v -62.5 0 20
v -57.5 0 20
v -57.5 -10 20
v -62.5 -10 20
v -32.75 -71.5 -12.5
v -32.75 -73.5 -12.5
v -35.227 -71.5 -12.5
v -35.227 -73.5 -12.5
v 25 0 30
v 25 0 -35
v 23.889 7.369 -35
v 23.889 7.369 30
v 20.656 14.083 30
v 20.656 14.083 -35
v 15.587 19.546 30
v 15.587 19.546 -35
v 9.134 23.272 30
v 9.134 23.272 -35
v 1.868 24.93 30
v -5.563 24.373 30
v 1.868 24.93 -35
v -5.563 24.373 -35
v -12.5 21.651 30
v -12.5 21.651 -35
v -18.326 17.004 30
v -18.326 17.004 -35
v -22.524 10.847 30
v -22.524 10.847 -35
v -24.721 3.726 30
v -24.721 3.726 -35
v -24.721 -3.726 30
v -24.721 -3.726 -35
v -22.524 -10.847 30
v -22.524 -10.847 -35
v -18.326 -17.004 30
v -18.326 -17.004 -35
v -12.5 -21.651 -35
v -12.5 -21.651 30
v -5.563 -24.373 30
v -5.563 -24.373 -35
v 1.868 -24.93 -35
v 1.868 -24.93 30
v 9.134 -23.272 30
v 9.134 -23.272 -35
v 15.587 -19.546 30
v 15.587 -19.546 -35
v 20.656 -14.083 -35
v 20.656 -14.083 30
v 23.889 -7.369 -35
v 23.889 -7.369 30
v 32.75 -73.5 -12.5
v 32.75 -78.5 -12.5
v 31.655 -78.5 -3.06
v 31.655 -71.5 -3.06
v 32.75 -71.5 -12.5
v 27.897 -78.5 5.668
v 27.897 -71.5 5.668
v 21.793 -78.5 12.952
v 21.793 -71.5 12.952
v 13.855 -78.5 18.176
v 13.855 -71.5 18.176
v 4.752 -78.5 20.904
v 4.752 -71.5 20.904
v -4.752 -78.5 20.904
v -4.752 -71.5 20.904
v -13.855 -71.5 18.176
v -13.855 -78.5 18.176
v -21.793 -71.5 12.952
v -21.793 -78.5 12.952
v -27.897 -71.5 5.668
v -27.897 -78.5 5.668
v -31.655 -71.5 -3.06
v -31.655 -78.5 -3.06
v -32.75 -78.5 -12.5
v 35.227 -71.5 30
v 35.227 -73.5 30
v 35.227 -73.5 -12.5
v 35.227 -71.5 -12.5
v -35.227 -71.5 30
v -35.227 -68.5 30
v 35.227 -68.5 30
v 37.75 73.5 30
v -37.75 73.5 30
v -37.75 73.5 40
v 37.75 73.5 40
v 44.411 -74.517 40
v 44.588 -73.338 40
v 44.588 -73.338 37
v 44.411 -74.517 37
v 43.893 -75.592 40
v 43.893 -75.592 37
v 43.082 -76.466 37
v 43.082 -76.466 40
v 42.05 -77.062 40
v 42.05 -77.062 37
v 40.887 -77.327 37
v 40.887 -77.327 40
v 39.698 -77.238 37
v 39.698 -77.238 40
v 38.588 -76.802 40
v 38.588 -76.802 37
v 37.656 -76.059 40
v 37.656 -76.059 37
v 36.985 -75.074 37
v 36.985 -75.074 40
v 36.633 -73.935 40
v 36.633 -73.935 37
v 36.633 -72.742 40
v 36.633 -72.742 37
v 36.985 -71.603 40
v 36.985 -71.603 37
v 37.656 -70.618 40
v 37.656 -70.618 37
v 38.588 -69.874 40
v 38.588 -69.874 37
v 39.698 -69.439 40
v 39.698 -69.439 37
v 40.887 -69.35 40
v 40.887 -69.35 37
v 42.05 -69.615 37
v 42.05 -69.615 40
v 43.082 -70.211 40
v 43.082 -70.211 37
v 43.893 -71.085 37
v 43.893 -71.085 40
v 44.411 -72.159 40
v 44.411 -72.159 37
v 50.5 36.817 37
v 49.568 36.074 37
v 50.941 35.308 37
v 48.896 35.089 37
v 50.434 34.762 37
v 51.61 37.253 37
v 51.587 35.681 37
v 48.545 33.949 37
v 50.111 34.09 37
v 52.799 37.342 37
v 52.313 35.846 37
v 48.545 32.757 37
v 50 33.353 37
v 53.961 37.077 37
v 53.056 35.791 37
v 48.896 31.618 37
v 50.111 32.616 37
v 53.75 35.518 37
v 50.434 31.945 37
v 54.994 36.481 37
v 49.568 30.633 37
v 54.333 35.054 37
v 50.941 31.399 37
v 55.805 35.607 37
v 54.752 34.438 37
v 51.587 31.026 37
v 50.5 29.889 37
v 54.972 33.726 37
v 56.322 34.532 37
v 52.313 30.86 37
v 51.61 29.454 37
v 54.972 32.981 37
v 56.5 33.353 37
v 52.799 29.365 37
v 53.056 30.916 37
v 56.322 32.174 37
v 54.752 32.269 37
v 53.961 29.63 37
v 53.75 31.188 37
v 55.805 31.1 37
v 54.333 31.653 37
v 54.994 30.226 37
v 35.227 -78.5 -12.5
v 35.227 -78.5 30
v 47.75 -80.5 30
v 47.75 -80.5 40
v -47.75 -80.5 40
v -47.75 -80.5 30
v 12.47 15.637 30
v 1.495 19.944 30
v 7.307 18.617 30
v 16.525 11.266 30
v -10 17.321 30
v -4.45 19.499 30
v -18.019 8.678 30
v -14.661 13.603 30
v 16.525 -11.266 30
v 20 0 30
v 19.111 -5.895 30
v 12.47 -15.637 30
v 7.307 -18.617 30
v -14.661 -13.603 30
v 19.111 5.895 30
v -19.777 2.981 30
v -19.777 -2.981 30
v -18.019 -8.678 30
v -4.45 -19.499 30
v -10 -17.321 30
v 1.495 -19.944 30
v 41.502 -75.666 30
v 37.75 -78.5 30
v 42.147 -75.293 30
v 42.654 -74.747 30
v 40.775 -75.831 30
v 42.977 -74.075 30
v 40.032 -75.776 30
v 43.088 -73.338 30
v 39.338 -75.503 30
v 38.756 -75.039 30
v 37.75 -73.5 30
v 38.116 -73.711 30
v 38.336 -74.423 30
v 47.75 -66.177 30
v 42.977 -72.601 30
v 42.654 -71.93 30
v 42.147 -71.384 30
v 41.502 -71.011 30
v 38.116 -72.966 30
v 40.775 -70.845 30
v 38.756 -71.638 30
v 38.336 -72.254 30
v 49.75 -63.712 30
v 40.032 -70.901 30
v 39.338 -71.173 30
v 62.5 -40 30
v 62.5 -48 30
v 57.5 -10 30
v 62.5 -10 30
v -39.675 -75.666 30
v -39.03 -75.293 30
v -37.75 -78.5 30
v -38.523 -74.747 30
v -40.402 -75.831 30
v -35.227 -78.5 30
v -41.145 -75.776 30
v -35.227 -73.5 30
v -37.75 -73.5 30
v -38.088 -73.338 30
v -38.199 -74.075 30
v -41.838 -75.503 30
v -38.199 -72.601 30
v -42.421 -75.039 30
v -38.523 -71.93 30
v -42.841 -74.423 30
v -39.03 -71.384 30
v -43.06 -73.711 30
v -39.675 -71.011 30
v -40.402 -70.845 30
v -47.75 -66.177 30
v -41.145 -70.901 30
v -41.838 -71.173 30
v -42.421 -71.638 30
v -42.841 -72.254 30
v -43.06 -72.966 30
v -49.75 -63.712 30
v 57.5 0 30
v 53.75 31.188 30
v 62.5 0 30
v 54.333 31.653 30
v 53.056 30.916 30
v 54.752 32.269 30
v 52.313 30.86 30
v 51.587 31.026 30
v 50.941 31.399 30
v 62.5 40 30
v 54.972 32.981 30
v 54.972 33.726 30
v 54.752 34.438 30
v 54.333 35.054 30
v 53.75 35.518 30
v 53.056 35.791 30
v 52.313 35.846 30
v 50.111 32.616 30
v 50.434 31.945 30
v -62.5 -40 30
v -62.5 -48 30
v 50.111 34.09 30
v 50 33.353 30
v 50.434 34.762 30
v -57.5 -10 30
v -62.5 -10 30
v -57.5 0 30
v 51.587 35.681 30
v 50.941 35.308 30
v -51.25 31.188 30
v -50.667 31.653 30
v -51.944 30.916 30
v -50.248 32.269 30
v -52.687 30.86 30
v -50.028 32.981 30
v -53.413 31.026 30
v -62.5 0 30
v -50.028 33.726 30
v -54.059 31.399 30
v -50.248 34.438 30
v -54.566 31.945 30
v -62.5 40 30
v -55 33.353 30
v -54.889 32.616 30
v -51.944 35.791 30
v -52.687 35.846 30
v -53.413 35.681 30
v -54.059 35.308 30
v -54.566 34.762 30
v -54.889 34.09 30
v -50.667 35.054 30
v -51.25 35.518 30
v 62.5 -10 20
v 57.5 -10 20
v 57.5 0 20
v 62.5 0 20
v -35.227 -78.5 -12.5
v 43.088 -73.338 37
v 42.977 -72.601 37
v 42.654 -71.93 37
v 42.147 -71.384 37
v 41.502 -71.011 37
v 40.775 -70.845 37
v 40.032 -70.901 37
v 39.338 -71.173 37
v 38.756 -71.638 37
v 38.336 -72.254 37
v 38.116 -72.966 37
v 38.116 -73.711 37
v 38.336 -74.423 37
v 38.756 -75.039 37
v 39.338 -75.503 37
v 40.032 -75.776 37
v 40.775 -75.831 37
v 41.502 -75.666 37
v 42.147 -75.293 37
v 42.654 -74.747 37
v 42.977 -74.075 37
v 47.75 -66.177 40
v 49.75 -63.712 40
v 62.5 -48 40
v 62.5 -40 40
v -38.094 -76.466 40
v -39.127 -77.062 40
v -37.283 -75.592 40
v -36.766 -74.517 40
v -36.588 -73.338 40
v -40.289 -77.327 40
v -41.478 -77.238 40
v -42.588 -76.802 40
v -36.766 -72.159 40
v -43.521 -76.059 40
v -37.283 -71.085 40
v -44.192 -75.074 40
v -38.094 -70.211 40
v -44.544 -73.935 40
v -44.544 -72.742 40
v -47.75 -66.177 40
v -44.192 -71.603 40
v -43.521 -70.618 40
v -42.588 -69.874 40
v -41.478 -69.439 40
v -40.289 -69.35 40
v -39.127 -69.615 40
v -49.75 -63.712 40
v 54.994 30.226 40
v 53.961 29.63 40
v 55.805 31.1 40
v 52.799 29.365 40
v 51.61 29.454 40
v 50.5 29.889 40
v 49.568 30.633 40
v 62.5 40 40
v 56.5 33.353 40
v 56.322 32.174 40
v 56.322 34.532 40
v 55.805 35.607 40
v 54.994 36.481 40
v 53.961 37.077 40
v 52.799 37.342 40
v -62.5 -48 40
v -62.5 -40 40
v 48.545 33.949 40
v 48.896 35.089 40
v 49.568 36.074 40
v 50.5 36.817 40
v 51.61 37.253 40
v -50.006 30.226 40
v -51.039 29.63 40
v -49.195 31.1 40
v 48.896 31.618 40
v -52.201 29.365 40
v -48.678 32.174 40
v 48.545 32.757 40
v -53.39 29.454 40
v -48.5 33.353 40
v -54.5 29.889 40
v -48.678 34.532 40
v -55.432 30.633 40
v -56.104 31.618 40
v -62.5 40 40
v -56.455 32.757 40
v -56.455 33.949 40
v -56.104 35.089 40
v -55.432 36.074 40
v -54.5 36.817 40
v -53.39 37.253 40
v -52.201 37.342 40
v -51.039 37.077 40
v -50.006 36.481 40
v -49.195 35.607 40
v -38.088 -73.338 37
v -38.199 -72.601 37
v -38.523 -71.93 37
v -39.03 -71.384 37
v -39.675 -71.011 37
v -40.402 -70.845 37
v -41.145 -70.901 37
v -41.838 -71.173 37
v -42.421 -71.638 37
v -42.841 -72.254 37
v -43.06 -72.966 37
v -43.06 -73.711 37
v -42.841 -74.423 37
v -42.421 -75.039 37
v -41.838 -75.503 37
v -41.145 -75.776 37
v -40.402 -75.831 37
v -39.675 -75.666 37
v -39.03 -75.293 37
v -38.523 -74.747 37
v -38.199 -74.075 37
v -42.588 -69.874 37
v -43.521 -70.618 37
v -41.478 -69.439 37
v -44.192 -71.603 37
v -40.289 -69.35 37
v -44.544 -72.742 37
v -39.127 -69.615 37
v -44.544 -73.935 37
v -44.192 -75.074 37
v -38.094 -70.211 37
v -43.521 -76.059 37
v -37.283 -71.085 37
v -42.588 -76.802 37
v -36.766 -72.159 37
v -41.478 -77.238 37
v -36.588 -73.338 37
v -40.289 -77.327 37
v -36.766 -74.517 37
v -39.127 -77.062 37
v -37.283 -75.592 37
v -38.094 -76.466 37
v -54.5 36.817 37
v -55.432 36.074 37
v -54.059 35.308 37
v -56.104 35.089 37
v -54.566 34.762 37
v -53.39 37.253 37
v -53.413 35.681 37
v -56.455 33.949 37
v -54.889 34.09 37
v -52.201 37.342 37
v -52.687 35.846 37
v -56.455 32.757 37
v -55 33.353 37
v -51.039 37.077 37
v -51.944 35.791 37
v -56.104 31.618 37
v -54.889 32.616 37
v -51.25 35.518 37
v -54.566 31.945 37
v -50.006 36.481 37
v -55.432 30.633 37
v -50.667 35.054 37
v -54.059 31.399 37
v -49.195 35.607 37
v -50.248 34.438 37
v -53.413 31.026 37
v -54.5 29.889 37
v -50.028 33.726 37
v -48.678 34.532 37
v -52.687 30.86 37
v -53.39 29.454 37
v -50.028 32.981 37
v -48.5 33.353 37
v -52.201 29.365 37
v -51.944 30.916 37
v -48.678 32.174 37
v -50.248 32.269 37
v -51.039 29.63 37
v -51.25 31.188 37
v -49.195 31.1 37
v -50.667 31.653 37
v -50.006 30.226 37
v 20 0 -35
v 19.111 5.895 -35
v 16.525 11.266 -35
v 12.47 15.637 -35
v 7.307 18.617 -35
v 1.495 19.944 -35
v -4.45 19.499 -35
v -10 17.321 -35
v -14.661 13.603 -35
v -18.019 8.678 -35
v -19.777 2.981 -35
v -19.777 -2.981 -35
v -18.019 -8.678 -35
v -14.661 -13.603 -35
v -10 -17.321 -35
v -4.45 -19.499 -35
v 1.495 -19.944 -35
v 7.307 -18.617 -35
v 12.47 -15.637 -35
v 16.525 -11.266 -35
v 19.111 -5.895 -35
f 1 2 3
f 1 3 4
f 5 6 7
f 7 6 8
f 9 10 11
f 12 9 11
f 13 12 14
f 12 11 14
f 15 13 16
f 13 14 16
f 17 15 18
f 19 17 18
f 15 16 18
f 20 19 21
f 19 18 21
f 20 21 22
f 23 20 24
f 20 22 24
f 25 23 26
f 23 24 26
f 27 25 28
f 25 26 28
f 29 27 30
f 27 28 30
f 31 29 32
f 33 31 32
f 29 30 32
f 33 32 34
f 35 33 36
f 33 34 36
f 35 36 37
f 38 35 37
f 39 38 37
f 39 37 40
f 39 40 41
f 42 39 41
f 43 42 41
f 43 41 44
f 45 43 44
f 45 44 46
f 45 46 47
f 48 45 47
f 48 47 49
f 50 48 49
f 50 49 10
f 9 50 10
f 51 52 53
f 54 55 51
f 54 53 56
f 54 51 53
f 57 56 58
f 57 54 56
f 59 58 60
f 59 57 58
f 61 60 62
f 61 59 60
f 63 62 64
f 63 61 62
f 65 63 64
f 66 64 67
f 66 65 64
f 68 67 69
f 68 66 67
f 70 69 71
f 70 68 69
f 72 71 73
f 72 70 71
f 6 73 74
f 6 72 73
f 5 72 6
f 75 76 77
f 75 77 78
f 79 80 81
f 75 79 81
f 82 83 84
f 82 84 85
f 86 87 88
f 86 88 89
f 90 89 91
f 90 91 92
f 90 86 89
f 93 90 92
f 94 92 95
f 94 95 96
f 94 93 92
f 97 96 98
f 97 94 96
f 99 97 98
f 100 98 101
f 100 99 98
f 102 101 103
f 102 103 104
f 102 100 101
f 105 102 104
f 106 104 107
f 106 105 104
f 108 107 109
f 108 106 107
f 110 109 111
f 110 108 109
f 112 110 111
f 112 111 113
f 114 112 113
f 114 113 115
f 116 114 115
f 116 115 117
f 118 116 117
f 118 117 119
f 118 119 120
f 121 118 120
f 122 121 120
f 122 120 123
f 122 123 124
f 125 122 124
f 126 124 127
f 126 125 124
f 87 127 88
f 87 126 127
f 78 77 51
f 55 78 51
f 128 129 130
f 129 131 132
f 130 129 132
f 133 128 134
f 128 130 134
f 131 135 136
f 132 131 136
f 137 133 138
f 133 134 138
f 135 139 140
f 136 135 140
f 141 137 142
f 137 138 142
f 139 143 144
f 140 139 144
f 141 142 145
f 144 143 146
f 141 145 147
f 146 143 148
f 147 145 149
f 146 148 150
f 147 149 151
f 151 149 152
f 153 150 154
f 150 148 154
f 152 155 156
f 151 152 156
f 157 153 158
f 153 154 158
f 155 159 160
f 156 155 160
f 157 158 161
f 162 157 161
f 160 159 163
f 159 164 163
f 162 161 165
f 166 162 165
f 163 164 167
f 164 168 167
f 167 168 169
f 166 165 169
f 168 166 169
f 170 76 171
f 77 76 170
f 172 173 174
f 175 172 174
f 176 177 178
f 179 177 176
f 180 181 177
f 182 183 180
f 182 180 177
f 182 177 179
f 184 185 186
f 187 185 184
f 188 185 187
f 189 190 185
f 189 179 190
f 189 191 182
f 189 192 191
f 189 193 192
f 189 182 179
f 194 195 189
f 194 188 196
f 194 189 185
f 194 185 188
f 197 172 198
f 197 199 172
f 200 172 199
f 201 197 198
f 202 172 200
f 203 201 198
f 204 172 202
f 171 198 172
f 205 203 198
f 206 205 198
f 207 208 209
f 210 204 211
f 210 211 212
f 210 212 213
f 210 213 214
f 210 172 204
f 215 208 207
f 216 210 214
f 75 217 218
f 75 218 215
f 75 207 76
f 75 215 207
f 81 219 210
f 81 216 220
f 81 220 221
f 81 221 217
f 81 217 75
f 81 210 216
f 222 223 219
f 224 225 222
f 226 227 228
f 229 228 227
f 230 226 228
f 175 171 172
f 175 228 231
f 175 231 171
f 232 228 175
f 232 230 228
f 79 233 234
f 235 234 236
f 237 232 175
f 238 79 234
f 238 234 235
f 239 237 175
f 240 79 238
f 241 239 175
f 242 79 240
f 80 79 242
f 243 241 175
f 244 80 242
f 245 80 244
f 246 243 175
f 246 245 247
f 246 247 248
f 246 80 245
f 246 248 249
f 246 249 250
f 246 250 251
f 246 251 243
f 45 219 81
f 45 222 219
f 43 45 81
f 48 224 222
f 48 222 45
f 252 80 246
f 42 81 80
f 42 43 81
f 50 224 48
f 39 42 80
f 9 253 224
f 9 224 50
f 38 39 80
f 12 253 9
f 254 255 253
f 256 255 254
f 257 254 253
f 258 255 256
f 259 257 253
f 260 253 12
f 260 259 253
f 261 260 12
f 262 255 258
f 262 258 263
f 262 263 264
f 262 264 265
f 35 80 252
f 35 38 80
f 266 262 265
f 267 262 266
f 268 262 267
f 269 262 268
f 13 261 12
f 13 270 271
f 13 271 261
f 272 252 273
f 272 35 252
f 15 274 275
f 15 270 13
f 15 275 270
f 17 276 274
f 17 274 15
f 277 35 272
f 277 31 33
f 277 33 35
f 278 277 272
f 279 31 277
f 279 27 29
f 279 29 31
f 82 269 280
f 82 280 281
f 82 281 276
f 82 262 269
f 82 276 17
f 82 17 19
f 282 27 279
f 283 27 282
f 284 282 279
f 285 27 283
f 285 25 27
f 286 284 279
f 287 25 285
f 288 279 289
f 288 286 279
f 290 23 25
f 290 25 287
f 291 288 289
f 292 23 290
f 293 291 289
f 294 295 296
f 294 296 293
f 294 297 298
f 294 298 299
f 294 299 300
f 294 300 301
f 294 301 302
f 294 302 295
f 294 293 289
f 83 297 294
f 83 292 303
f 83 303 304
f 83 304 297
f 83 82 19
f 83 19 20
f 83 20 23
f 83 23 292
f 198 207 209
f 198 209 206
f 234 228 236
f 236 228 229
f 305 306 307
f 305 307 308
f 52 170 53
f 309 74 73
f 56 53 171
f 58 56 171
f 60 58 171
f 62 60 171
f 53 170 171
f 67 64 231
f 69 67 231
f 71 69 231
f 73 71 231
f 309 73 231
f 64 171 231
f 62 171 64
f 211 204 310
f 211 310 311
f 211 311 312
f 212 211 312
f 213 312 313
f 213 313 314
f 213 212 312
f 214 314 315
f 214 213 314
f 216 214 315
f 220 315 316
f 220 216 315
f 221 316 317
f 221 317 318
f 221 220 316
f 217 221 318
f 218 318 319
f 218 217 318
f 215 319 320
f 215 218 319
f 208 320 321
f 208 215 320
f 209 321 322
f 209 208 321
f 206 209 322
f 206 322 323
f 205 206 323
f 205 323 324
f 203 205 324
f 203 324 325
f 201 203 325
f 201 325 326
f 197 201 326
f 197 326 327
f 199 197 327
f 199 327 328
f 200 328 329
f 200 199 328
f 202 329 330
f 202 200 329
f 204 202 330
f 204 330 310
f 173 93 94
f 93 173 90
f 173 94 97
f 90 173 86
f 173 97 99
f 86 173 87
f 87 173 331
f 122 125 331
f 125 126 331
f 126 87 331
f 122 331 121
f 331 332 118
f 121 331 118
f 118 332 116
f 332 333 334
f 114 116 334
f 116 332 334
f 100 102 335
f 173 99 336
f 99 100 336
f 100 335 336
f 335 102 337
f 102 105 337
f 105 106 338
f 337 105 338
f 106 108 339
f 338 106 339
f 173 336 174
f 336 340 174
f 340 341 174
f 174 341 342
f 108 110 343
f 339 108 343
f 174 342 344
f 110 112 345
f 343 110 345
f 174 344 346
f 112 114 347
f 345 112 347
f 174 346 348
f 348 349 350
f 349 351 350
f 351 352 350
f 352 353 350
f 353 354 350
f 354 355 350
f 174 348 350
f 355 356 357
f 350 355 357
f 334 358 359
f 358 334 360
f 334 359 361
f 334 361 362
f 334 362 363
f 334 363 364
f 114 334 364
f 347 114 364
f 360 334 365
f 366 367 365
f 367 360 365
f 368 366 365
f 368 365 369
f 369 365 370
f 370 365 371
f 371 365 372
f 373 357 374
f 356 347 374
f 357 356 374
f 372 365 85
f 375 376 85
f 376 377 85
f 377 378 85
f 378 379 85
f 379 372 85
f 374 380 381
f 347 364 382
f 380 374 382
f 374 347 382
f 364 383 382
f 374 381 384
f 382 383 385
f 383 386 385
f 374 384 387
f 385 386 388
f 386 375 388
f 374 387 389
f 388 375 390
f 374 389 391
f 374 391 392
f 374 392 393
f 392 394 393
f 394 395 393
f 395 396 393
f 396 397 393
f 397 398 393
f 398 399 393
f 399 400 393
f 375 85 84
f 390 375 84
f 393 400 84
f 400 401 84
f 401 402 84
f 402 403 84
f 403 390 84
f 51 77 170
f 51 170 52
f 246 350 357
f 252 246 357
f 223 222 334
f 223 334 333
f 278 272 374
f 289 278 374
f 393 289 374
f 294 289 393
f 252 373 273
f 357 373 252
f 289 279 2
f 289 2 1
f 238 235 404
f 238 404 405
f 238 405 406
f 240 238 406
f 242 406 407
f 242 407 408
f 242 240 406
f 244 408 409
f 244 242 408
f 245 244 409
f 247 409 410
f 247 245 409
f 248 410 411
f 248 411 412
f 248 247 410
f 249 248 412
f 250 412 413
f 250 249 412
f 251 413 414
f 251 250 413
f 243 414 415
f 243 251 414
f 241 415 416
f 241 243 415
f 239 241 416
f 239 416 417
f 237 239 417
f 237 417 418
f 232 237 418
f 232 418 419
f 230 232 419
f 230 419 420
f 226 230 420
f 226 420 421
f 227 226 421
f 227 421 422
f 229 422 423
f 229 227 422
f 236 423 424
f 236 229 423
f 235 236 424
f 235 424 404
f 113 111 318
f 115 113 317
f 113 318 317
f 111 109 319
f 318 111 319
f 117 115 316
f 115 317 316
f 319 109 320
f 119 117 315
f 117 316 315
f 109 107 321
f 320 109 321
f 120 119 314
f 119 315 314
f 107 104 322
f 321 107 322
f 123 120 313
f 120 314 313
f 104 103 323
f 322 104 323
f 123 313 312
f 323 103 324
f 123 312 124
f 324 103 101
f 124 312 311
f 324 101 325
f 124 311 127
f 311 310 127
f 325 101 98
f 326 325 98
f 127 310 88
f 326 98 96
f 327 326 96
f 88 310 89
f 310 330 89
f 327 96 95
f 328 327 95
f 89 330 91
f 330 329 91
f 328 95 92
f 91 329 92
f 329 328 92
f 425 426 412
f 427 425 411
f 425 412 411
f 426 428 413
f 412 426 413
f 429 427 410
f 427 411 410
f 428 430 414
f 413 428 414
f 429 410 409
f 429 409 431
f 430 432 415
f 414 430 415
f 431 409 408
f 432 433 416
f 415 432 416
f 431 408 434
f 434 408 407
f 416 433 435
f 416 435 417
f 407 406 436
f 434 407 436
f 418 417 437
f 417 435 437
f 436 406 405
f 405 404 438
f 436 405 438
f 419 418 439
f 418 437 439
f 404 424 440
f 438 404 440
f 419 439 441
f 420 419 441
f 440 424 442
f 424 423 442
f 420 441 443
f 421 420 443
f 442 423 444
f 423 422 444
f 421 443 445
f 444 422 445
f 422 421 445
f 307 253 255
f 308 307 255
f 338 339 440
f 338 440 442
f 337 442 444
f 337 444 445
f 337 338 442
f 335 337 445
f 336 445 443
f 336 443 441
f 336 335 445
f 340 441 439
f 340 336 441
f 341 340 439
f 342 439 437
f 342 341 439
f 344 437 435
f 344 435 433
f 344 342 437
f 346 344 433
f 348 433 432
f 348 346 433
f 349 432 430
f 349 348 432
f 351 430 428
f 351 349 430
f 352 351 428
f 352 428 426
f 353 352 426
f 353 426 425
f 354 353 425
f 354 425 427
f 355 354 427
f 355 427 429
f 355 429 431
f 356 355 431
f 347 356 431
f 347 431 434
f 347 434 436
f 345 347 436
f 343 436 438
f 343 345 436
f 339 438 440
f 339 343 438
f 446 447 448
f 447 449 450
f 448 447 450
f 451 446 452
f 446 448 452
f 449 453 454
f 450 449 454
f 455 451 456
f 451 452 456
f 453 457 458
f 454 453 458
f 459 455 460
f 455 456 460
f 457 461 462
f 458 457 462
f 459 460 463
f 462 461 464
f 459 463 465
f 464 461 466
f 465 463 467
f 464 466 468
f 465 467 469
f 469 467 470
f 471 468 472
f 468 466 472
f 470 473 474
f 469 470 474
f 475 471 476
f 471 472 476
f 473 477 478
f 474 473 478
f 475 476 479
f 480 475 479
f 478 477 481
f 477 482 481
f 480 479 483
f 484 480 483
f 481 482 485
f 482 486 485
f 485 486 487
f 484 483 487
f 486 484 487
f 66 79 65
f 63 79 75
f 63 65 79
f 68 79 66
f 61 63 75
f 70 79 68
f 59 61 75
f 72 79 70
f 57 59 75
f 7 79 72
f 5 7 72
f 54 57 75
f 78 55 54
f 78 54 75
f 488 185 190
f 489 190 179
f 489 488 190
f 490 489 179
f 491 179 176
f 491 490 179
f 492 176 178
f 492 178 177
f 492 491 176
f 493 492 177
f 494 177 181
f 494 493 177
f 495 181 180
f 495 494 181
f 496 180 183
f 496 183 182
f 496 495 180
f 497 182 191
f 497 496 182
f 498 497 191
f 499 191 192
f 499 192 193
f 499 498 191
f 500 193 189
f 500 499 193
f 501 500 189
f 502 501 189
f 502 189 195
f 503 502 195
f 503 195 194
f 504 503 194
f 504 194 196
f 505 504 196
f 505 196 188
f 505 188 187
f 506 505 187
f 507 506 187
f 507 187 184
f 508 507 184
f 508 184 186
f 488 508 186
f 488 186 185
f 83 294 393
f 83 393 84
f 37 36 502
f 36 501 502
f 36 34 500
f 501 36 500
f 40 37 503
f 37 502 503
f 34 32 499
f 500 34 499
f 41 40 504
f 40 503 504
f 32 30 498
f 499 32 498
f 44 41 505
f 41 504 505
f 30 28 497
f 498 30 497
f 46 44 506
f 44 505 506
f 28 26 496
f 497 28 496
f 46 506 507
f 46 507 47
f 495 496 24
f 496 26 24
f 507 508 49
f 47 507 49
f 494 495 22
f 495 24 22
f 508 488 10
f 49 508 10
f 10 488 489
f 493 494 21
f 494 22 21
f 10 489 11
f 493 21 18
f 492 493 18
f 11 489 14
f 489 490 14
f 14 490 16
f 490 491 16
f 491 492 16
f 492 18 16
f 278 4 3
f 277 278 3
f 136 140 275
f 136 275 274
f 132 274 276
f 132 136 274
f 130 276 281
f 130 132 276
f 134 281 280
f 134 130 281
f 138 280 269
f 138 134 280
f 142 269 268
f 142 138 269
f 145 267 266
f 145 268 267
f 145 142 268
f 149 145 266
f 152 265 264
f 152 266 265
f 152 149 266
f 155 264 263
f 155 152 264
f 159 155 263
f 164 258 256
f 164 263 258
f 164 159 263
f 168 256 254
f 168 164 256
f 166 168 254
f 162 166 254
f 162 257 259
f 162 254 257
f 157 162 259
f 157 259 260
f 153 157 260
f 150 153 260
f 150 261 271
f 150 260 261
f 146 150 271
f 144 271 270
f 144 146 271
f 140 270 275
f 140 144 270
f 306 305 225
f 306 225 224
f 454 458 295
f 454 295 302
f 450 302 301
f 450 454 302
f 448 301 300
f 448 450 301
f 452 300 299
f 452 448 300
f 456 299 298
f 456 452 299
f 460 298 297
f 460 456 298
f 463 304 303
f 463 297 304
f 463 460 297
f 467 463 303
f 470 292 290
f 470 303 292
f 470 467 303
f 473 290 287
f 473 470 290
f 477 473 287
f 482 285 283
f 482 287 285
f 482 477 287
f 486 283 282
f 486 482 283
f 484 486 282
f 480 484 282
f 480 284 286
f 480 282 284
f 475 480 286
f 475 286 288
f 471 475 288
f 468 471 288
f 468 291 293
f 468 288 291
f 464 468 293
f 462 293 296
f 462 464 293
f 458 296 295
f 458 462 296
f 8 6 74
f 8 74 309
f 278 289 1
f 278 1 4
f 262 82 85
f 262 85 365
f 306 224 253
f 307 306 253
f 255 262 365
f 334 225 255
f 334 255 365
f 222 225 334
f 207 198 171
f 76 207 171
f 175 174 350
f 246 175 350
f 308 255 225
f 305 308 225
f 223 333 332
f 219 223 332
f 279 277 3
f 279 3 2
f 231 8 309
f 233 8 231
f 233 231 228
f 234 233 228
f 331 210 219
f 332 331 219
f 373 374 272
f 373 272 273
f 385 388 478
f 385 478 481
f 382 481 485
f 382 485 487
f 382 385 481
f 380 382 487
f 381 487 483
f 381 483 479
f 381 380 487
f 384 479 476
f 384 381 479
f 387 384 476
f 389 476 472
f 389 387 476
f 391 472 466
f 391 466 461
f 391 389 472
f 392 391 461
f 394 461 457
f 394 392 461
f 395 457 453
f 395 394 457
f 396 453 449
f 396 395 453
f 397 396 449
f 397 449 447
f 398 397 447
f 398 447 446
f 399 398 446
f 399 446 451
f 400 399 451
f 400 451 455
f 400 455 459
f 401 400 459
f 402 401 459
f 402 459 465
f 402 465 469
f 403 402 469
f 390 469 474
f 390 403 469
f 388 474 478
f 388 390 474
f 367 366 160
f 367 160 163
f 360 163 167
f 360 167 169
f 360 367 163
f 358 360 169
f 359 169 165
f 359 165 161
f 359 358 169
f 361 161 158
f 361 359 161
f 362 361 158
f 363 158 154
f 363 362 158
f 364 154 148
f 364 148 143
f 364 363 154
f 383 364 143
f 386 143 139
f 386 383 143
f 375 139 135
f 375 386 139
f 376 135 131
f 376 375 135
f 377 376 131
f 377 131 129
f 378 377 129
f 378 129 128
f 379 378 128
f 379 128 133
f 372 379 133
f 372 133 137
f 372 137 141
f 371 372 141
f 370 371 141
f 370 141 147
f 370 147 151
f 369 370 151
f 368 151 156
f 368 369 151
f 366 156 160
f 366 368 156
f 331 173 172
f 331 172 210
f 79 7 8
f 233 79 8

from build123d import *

# Parameters (mm, degrees)
ESTRUSIONE_ESTRUSIONE1_DEPTH      = 30
ESTRUSIONE_ESTRUSIONE1_DEPTH_BACK = 55
SCHIZZO1_R                        = 25
SCHIZZO1_R_2                      = 20
ESTRUSIONE_ESTRUSIONE2_DEPTH      = 10
ESTRUSIONE_ESTRUSIONE3_DEPTH      = 10
ESTRUSIONE_ESTRUSIONE5_DEPTH      = 42.5
TAGLIO_ESTRUSIONE1_DEPTH          = 26.5
SCHIZZO3D5_R                      = 2.5
TAGLIO_ESTRUSIONE2_DEPTH          = 35.5
SCHIZZO3D6_R                      = 4
TAGLIO_ESTRUSIONE3_DEPTH          = 3
ESTRUSIONE_ESTRUSIONE10_DEPTH     = 5
TAGLIO_ESTRUSIONE4_START          = -14
TAGLIO_ESTRUSIONE4_DEPTH          = 14
TAGLIO_ESTRUSIONE7_DEPTH          = 3
ESTRUSIONE_ESTRUSIONE11_START     = 30
ESTRUSIONE_ESTRUSIONE11_OUTLINE_R = 4
ESTRUSIONE_ESTRUSIONE11_DEPTH     = 10
ESTRUSIONE_ESTRUSIONE12_DEPTH     = 10
ESTRUSIONE_ESTRUSIONE13_DEPTH     = 10
ESTRUSIONE_ESTRUSIONE14_DEPTH     = 10
TAGLIO_ESTRUSIONE11_DEPTH         = 80
SCHIZZO3D17_R                     = 4
TAGLIO_ESTRUSIONE12_DEPTH         = 3
TAGLIO_ESTRUSIONE13_START         = 30
TAGLIO_ESTRUSIONE13_OUTLINE_R     = 2.5
TAGLIO_ESTRUSIONE13_DEPTH         = 7
TAGLIO_ESTRUSIONE14_START         = -55
TAGLIO_ESTRUSIONE14_OUTLINE_R     = 25
TAGLIO_ESTRUSIONE14_OUTLINE_R_2   = 20
TAGLIO_ESTRUSIONE14_DEPTH         = 20


# Read off the part's stored shape, not the designer's step: Estrusione-Estrusione11, Taglio-Estrusione13, Taglio-Estrusione14
with BuildPart() as part:
    # Schizzo1 → Estrusione-Estrusione1 (new, two sides: drawn at the far end of the back side and taken through both)
    with BuildSketch(Plane.XY.offset(-ESTRUSIONE_ESTRUSIONE1_DEPTH_BACK)):
        Circle(SCHIZZO1_R)
        Circle(SCHIZZO1_R_2, mode=Mode.SUBTRACT)
    extrude(amount=ESTRUSIONE_ESTRUSIONE1_DEPTH + ESTRUSIONE_ESTRUSIONE1_DEPTH_BACK)

    # Schizzo3D1 → Estrusione-Estrusione2 (add)
    with BuildSketch(Plane(origin=(-37.75, 73.5, 30), x_dir=(0.4568693936855125, -0.889533786381064, 0), z_dir=(0, 0, -1))):
        Polygon((0, 0), (34.493639223, -67.159800872), (75.600538561, -73.870637396), (146.763241471, -37.321085901), (165.255105821, 0), (130.761466598, 67.159800872), (89.654567261, 73.870637396), (18.49186435, 37.321085901), align=None)
    extrude(amount=-ESTRUSIONE_ESTRUSIONE2_DEPTH)

    # Schizzo3D2 → Estrusione-Estrusione3 (add)
    with BuildSketch(Plane(origin=(62.5, 0, 30), x_dir=(-0.9968152785361251, -0.07974522228289001, 0), z_dir=(0, 0, 1))):
        Polygon((0, 0), (0.797452223, 9.968152785), (5.781528616, 9.569426674), (4.984076393, -0.398726111), align=None)
        Polygon((125.39936204, 0), (120.415285647, 0.398726111), (119.617833424, -9.569426674), (124.601909817, -9.968152785), align=None)
    extrude(amount=-ESTRUSIONE_ESTRUSIONE3_DEPTH)

    # Schizzo3D3 → Estrusione-Estrusione5 (add)
    with BuildSketch(Plane(origin=(35.227450684, -68.5, 30), x_dir=(-0.9974912873801348, -0.0707893466612134, 0), z_dir=(0, 0, 1))):
        Polygon((0, 0), (70.278150268, -4.987456437), (70.632097001, 0), (0.353946733, 4.987456437), align=None)
    extrude(amount=-ESTRUSIONE_ESTRUSIONE5_DEPTH)

    # Schizzo3D4 → Taglio-Estrusione1 (cut)
    with BuildSketch(Plane(origin=(32.75, -68.5, -12.5), x_dir=(-1, 0, 0), z_dir=(0, 1, 0))):
        with BuildLine():
            Line((0, 0), (65.5, 0))
            ThreePointArc((65.5, 0), (32.75, 32.75), (0, 0))
        make_face()
    extrude(amount=-TAGLIO_ESTRUSIONE1_DEPTH, mode=Mode.SUBTRACT)

    # Schizzo3D5 → Taglio-Estrusione2 (cut)
    with BuildSketch(Plane(origin=(-52.5, 33.353317087, 40), x_dir=(0.8440673996564301, -0.5362370975951146, 0), z_dir=(0, 0, -1))):
        with Locations(Location((0, 0, 0), (0, 0, 147.572152721))):
            Circle(SCHIZZO3D5_R)
        with Locations(Location((88.627076964, -56.304895247, 0), (0, 0, 147.572152721))):
            Circle(SCHIZZO3D5_R)
        with Locations(Location((124.397648864, 0, 0), (0, 0, 147.572152721))):
            Circle(SCHIZZO3D5_R)
        with Locations(Location((35.7705719, 56.304895247, 0), (0, 0, 147.572152721))):
            Circle(SCHIZZO3D5_R)
    extrude(amount=TAGLIO_ESTRUSIONE2_DEPTH, mode=Mode.SUBTRACT)

    # Schizzo3D6 → Taglio-Estrusione3 (cut)
    with BuildSketch(Plane(origin=(0, 73.5, 40), x_dir=(0, -1, 0), z_dir=(0, 0, -1))):
        with Locations(Location((40.146682913, 52.5, 0), (0, 0, 270))):
            Circle(SCHIZZO3D6_R)
        with Locations(Location((40.146682913, -52.5, 0), (0, 0, 270))):
            Circle(SCHIZZO3D6_R)
        with Locations(Location((106.853317087, -52.5, 0), (0, 0, 270))):
            Circle(SCHIZZO3D6_R)
        with Locations(Location((106.853317087, 52.5, 0), (0, 0, 270))):
            Circle(SCHIZZO3D6_R)
    extrude(amount=TAGLIO_ESTRUSIONE3_DEPTH, mode=Mode.SUBTRACT)

    # Schizzo3D7 → Estrusione-Estrusione10 (add)
    with BuildSketch(Plane(origin=(35.227450684, -73.5, -12.5), x_dir=(-0.8117651174974726, 0, 0.5839840700004706), z_dir=(0, 1, 0))):
        with BuildLine():
            Line((0, 0), (2.011108045, -1.446791734))
            ThreePointArc((2.011108045, -1.446791734), (47.721893936, 6.013037572), (55.181723242, -39.697748319))
            Line((55.181723242, -39.697748319), (57.192831287, -41.144540052))
            Line((57.192831287, -41.144540052), (82.012154262, -6.644522559))
            Line((82.012154262, -6.644522559), (84.059871804, -8.117651175))
            Line((84.059871804, -8.117651175), (89.899712504, 0))
            Line((89.899712504, 0), (28.611446133, 44.090797285))
            Line((28.611446133, 44.090797285), (22.771605433, 35.97314611))
            Line((22.771605433, 35.97314611), (24.819322975, 34.500017494))
            Line((24.819322975, 34.500017494), (0, 0))
        make_face()
    extrude(amount=-ESTRUSIONE_ESTRUSIONE10_DEPTH)

    # Schizzo3D8 → Taglio-Estrusione4 (cut)
    with BuildSketch(Plane(origin=(0, -78.5, 20.25), x_dir=(-0.707106781186551, 0, -0.7071067811865441), z_dir=(0, -1, 0)).offset(TAGLIO_ESTRUSIONE4_START)):
        with BuildLine():
            ThreePointArc((0, 46.315494168), (-0.707106781, -0.707106781), (46.315494168, 0))
            ThreePointArc((46.315494168, 0), (0, 0), (0, 46.315494168))
        make_face()
    extrude(amount=TAGLIO_ESTRUSIONE4_DEPTH, mode=Mode.SUBTRACT)

    # Schizzo3D9 → Taglio-Estrusione7 (cut)
    with BuildSketch(Plane(origin=(35.227450684, -68.5, -12.5), x_dir=(-0.8562730712113632, 0, 0.5165234046180869), z_dir=(0, -1, 0))):
        with BuildLine():
            Line((0, 0), (2.121374306, 1.279661262))
            ThreePointArc((2.121374306, 1.279661262), (13.749394894, 45.407843828), (58.20726047, 35.111944264))
            Line((58.20726047, 35.111944264), (60.328634776, 36.391605526))
            Line((60.328634776, 36.391605526), (82.280879472, 0))
            Line((82.280879472, 0), (21.952244696, -36.391605526))
            Line((21.952244696, -36.391605526), (0, 0))
        make_face()
    extrude(amount=TAGLIO_ESTRUSIONE7_DEPTH, mode=Mode.SUBTRACT)

    # Estrusione-Estrusione11 outline → Estrusione-Estrusione11 (add)
    with BuildSketch(Plane.XY.offset(ESTRUSIONE_ESTRUSIONE11_START)):
        with Locations((52.5, -33.353317087)):
            Circle(ESTRUSIONE_ESTRUSIONE11_OUTLINE_R)
        with Locations((-52.5, -33.353317087)):
            Circle(ESTRUSIONE_ESTRUSIONE11_OUTLINE_R)
    extrude(amount=ESTRUSIONE_ESTRUSIONE11_DEPTH)

    # Schizzo3D11 → Estrusione-Estrusione12 (add)
    with BuildSketch(Plane(origin=(-62.5, -40, 40), x_dir=(0.9979582700578467, -0.06386932928370219, 0), z_dir=(0, 0, -1))):
        Polygon((0, 0), (0.510954634, 7.98366616), (27.158436361, 36.840627497), (26.839089715, 31.850836147), align=None)
        Polygon((102.504285751, 32.018493137), (102.184939104, 27.028701786), (124.744783757, -7.98366616), (125.255738392, 0), align=None)
    extrude(amount=ESTRUSIONE_ESTRUSIONE12_DEPTH)

    # Schizzo3D12 → Estrusione-Estrusione13 (add)
    with BuildSketch(Plane(origin=(-37.75, -78.5, 40), x_dir=(0.9932296706390209, 0.11616721294023631, 0), z_dir=(0, 0, 1))):
        Polygon((0, 0), (-9.932296706, 1.161672129), (-8.770624577, 11.093968836), (1.161672129, 9.932296706), align=None)
        Polygon((74.988840133, -8.770624577), (84.92113684, -9.932296706), (86.082808969, 0), (76.150512263, 1.161672129), align=None)
    extrude(amount=-ESTRUSIONE_ESTRUSIONE13_DEPTH)

    # Schizzo3D15 → Estrusione-Estrusione14 (add)
    with BuildSketch(Plane(origin=(-49.75, -63.712121212, 40), x_dir=(0.9860632358712049, -0.16637095558783233, 0), z_dir=(0, 0, 1))):
        Polygon((0, 0), (4.627662115, -4.074759177), (2.768690441, -4.388409339), (4.432399997, -14.249041698), (98.601439022, 1.639384561), (96.937729467, 11.500016919), (95.078757792, 11.186366757), (98.113291969, 16.553910081), (100.573565494, 1.972126472), (100.906307405, 0), (2.793015436, -16.553910081), (2.460273525, -14.581783609), align=None)
    extrude(amount=-ESTRUSIONE_ESTRUSIONE14_DEPTH)

    # Schizzo3D16 → Taglio-Estrusione11 (cut)
    with BuildSketch(Plane(origin=(-49.75, -80.5, 40), x_dir=(0.9860632358712049, 0.16637095558783233, 0), z_dir=(0, 0, 1))):
        Polygon((0, 0), (1.972126472, -0.332741911), (4.35509632, 13.790870902), (2.793015436, 16.553910081), align=None)
        Polygon((98.113291969, -16.553910081), (96.141165497, -16.22116817), (98.524135346, -2.097555357), (100.906307405, 0), align=None)
    extrude(amount=-TAGLIO_ESTRUSIONE11_DEPTH, mode=Mode.SUBTRACT)

    # Schizzo3D17 → Taglio-Estrusione12 (cut)
    with BuildSketch(Plane(origin=(0, -80.5, 40), x_dir=(-0.9847878761773714, 0.17376086709631217, 0), z_dir=(0, 0, -1))):
        with Locations(Location((41.215356952, 0, 0), (0, 0, 169.993443701))):
            Circle(SCHIZZO3D17_R)
        with Locations(Location((-38.726539684, 14.10534554, 0), (0, 0, 169.993443701))):
            Circle(SCHIZZO3D17_R)
    extrude(amount=TAGLIO_ESTRUSIONE12_DEPTH, mode=Mode.SUBTRACT)

    # Taglio-Estrusione13 outline → Taglio-Estrusione13 (cut)
    with BuildSketch(Plane.XY.offset(TAGLIO_ESTRUSIONE13_START)):
        with Locations((-40.588383838, -73.338383838)):
            Circle(TAGLIO_ESTRUSIONE13_OUTLINE_R)
        with Locations((40.588383838, -73.338383838)):
            Circle(TAGLIO_ESTRUSIONE13_OUTLINE_R)
    extrude(amount=TAGLIO_ESTRUSIONE13_DEPTH, mode=Mode.SUBTRACT)

    # Taglio-Estrusione14 outline → Taglio-Estrusione14 (cut)
    with BuildSketch(Plane.XY.offset(TAGLIO_ESTRUSIONE14_START)):
        Circle(TAGLIO_ESTRUSIONE14_OUTLINE_R)
        Circle(TAGLIO_ESTRUSIONE14_OUTLINE_R_2, mode=Mode.SUBTRACT)
    extrude(amount=TAGLIO_ESTRUSIONE14_DEPTH, mode=Mode.SUBTRACT)


solid = part.part
